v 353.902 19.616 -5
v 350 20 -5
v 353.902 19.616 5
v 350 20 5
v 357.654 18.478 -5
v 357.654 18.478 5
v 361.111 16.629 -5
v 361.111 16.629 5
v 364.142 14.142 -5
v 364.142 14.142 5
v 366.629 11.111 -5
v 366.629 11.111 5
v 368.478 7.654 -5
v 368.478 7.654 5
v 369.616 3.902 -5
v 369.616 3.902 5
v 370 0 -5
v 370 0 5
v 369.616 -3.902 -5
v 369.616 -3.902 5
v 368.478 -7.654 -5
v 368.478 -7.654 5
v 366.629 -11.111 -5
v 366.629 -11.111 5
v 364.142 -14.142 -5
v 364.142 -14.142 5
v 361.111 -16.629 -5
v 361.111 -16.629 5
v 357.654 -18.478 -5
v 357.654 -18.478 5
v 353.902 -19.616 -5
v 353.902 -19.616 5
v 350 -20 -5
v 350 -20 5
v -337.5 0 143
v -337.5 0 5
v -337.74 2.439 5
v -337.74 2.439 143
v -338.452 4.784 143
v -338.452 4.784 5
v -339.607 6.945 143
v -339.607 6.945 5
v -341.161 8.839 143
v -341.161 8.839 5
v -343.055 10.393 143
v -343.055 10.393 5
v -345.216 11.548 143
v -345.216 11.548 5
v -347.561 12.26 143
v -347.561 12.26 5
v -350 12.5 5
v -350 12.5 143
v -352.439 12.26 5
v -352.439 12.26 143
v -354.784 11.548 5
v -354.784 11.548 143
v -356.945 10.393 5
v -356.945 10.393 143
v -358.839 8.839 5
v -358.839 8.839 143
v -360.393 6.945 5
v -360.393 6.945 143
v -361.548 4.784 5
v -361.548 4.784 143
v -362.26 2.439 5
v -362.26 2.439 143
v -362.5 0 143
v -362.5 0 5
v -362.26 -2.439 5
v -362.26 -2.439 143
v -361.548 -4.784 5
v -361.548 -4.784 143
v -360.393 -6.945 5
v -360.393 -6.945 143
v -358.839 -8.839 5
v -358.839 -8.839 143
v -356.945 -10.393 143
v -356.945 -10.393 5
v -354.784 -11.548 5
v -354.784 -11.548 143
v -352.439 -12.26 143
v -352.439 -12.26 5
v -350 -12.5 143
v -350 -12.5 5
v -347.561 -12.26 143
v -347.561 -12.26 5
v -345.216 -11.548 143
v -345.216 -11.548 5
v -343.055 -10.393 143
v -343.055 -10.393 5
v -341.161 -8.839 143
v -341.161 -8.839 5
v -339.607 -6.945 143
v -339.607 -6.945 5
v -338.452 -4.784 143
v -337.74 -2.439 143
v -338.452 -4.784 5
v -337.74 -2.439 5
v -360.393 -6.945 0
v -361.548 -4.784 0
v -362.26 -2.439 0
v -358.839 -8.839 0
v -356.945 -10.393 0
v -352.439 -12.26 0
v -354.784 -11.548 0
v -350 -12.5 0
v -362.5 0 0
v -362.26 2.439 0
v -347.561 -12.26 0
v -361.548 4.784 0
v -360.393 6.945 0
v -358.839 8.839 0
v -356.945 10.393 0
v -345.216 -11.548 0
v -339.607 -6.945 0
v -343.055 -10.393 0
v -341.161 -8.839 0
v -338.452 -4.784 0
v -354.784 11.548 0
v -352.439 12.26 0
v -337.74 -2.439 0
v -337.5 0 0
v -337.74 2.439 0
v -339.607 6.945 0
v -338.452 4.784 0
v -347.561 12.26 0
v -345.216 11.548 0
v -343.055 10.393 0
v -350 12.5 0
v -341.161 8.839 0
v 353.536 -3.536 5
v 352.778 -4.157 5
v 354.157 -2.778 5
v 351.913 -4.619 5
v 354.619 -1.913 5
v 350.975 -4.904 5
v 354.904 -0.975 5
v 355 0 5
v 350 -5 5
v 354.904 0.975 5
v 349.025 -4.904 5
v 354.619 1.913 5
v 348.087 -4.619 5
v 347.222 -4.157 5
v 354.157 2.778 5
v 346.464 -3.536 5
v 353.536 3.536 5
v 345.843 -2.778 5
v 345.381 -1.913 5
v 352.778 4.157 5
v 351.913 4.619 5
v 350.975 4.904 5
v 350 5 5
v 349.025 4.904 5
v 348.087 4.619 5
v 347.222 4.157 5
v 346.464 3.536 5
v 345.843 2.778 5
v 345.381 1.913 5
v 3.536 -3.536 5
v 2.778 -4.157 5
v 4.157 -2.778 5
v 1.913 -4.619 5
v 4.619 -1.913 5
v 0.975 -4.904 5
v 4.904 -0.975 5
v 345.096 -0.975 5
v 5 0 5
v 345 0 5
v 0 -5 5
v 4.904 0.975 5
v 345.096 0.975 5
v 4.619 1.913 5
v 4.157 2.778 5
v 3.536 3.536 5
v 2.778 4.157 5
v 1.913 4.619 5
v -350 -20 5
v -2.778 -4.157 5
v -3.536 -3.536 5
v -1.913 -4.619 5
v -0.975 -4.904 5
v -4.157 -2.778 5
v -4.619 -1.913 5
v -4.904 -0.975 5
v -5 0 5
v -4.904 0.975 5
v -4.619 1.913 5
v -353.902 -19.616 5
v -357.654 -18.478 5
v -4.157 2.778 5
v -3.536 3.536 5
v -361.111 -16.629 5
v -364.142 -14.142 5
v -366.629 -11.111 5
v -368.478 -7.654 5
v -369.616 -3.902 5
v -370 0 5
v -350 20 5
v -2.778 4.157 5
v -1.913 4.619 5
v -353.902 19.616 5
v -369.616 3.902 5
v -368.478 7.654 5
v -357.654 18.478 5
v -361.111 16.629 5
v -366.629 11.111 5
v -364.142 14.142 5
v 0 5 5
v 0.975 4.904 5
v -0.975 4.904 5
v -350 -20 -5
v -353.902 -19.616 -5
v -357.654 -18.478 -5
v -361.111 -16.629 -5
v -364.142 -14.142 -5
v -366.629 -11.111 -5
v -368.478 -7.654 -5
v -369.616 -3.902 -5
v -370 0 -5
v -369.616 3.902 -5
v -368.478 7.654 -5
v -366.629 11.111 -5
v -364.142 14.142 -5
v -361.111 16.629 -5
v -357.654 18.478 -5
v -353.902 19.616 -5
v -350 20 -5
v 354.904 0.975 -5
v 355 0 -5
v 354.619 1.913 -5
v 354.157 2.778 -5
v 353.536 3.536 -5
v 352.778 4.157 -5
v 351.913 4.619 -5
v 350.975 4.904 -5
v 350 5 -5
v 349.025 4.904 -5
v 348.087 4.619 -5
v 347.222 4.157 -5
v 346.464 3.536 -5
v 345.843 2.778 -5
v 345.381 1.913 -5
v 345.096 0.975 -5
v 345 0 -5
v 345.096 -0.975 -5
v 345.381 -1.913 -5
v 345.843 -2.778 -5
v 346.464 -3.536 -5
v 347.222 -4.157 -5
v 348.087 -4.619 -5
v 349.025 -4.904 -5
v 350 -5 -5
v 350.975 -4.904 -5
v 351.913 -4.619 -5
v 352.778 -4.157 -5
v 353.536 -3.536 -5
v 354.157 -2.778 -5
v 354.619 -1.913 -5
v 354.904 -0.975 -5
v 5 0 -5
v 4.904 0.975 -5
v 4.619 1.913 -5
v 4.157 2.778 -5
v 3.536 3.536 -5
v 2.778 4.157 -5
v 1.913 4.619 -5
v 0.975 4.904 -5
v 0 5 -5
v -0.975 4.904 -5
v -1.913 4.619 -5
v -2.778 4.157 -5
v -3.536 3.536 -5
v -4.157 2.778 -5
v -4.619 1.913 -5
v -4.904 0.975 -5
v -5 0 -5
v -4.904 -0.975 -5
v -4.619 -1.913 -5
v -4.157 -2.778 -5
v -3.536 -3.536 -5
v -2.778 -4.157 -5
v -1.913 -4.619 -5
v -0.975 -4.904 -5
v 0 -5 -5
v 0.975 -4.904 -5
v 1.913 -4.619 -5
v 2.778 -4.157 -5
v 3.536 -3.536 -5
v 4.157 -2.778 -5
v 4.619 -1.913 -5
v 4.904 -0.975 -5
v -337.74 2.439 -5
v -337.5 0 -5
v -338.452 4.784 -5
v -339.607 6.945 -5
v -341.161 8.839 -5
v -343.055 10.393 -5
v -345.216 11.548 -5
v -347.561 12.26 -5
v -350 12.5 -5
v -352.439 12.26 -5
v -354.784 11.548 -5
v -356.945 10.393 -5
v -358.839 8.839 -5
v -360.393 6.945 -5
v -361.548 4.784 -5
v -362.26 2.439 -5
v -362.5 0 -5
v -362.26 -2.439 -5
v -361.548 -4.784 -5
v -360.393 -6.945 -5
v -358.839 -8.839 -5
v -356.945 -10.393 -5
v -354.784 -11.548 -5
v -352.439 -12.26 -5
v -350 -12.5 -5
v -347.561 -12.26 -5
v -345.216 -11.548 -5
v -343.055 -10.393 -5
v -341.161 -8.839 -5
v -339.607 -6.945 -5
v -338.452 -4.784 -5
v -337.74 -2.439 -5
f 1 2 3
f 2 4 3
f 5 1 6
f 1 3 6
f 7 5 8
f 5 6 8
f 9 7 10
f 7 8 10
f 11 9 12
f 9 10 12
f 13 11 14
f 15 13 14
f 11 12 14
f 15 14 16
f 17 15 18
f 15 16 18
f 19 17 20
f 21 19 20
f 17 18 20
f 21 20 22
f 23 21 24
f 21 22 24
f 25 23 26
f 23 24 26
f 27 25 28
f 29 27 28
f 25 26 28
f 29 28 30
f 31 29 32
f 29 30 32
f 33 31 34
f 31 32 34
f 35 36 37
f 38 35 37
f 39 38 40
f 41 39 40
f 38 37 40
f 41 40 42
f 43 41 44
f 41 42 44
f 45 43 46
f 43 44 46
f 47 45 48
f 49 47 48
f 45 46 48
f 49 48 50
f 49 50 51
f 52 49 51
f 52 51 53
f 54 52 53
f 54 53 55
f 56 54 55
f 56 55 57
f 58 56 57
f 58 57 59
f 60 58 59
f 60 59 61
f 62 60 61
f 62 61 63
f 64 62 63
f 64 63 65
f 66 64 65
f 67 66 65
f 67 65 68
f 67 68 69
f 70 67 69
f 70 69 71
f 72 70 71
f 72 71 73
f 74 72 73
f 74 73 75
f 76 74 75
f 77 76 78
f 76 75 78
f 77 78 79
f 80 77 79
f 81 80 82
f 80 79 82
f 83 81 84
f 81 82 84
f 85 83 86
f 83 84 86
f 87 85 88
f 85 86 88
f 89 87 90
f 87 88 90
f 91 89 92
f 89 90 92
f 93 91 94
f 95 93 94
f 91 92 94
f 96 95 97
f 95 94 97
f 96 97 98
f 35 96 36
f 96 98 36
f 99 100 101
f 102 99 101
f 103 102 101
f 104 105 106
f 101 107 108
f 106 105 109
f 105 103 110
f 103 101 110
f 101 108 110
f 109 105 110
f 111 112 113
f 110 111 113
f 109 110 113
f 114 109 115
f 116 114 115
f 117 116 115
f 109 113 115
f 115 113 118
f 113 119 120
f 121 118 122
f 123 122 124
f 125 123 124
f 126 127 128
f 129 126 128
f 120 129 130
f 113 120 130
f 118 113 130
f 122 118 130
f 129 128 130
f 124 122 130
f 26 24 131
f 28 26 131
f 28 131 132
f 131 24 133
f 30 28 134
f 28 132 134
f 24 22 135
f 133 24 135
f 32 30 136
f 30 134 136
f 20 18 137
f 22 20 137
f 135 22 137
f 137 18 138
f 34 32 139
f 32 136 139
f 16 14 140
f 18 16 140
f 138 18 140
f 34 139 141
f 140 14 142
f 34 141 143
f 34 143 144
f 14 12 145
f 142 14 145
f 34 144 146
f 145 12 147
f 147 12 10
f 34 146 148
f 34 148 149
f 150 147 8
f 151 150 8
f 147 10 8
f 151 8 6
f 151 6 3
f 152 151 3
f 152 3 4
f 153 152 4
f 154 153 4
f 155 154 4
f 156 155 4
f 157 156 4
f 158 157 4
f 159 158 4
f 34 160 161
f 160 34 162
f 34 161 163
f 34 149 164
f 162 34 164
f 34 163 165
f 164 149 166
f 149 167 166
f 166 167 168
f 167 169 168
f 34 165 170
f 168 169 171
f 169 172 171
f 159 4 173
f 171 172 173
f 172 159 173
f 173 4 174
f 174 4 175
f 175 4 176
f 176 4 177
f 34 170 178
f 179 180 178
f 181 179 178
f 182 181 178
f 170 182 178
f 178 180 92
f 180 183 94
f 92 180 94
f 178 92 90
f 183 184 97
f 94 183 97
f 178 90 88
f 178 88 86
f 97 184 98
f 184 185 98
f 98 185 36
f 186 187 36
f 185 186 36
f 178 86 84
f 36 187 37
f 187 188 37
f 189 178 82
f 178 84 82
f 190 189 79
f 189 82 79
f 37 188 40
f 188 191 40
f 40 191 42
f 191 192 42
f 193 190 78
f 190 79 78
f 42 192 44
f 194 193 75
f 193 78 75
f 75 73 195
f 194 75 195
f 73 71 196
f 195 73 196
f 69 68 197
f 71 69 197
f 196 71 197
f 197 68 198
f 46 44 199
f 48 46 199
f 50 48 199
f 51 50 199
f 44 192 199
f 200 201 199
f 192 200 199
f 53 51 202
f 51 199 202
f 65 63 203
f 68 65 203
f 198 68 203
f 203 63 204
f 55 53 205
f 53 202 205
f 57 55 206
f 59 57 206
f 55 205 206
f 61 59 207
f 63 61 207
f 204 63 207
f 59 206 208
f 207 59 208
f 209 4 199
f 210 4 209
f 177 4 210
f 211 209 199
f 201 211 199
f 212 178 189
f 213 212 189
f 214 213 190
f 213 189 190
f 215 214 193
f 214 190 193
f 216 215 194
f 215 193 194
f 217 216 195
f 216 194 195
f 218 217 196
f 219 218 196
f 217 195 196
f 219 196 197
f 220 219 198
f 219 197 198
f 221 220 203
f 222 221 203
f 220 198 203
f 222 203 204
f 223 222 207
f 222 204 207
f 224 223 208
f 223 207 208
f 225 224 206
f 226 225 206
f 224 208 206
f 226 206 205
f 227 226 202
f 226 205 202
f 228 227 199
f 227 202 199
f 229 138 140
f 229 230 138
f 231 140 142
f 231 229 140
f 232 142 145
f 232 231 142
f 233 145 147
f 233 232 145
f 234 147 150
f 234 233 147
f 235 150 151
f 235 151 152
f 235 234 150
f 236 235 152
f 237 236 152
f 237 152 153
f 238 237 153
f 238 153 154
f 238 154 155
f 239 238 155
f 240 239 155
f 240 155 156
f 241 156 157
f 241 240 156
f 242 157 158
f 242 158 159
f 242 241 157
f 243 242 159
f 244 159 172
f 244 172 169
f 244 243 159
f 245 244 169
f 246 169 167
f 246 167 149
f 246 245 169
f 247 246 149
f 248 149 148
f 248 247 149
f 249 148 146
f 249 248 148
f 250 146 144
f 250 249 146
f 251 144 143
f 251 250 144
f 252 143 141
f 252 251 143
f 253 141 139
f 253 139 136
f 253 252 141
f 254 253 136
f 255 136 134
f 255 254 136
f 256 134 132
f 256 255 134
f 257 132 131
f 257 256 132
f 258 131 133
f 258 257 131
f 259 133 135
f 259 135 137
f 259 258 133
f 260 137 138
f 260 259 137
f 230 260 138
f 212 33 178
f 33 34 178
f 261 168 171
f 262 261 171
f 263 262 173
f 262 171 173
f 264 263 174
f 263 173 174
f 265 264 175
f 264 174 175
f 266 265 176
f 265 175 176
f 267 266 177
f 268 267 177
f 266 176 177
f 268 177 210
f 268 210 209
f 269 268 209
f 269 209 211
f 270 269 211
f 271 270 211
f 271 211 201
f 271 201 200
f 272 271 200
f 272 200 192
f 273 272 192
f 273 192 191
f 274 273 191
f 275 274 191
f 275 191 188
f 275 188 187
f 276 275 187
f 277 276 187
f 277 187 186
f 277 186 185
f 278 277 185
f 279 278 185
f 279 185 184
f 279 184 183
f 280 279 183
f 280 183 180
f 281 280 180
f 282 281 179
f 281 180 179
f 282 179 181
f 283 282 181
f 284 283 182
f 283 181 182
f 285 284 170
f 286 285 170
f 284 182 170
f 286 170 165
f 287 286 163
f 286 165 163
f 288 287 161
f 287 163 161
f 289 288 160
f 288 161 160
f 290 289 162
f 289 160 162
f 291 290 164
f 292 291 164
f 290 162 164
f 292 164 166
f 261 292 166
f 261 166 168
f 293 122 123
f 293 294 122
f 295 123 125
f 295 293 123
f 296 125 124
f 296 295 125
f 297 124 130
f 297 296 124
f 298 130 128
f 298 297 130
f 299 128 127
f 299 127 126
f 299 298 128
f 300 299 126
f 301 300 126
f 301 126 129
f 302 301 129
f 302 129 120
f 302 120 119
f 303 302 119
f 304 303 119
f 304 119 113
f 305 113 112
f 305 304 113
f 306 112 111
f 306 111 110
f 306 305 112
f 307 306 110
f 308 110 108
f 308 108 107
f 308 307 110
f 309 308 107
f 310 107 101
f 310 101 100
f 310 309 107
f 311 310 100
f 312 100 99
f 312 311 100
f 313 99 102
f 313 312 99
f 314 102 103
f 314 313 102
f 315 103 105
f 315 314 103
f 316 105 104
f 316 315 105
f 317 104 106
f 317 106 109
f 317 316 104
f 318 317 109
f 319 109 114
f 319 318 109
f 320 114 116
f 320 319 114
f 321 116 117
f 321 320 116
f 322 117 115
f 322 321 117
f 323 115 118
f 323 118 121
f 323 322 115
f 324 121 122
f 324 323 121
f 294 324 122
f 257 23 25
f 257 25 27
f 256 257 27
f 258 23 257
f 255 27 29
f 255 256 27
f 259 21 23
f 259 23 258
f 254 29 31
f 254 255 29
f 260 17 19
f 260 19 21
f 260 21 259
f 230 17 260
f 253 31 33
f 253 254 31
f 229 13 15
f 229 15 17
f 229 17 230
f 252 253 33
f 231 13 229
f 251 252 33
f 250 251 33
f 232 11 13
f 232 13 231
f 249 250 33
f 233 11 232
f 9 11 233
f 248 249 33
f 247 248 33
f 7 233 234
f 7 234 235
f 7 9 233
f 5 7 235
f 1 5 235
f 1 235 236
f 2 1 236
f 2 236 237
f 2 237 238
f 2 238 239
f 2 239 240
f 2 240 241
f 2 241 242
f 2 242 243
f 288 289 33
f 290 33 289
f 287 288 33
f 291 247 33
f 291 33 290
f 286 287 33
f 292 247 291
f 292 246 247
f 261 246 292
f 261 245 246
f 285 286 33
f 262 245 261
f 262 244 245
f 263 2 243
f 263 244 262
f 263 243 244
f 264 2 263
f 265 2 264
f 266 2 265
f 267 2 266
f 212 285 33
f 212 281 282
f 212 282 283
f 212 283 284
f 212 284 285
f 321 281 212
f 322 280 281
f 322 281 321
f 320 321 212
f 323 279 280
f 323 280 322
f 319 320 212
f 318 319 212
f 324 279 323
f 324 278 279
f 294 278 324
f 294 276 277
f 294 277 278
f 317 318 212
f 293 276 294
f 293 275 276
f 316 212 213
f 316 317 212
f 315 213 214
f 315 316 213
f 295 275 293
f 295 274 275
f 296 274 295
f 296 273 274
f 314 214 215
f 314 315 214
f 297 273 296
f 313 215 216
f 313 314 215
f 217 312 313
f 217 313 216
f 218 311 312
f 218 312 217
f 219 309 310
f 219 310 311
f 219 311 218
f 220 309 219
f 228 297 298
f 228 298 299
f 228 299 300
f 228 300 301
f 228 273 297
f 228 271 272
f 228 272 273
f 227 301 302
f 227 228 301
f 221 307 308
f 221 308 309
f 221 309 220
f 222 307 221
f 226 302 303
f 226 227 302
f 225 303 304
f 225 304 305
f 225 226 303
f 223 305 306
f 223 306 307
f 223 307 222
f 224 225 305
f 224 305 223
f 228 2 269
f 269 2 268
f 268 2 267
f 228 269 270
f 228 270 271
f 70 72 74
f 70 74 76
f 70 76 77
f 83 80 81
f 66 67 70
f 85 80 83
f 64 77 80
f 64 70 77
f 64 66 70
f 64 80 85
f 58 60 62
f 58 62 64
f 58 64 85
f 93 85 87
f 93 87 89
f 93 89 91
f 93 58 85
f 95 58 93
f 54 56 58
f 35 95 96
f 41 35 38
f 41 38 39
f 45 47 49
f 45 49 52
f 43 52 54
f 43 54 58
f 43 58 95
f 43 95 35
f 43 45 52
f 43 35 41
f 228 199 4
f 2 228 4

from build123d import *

# Parameters (mm, degrees)
IZIM1_R                     = 5
IZIM1_R_2                   = 12.5
Y_KSEKLIK_EKSTR_ZYON1_DEPTH = 5
IZIM2_R                     = 5
KES_EKSTR_ZYON1_DEPTH       = 15
IZIM1_3_R                   = 12.5
Y_KSEKLIK_EKSTR_ZYON2_DEPTH = 143


with BuildPart() as part:
    # Çizim1 → Yükseklik-Ekstrüzyon1 (new, symmetric)
    with BuildSketch(Plane.XY):
        with BuildLine():
            Line((-350, 20), (350, 20))
            ThreePointArc((350, 20), (370, 0), (350, -20))
            Line((350, -20), (-350, -20))
            ThreePointArc((-350, -20), (-370, 0), (-350, 20))
        make_face()
        with Locations((350, 0)):
            Circle(IZIM1_R, mode=Mode.SUBTRACT)
        with Locations((-350, 0)):
            Circle(IZIM1_R_2, mode=Mode.SUBTRACT)
    extrude(amount=Y_KSEKLIK_EKSTR_ZYON1_DEPTH, both=True)

    # Çizim2 → Kes-Ekstrüzyon1 (cut)
    with BuildSketch(Plane.XY.offset(5)):
        Circle(IZIM2_R)
    extrude(amount=-KES_EKSTR_ZYON1_DEPTH, mode=Mode.SUBTRACT)

    # Çizim1<3> → Yükseklik-Ekstrüzyon2 (add)
    with BuildSketch(Plane.XY):
        with Locations((-350, 0)):
            Circle(IZIM1_3_R)
    extrude(amount=Y_KSEKLIK_EKSTR_ZYON2_DEPTH)


solid = part.part
